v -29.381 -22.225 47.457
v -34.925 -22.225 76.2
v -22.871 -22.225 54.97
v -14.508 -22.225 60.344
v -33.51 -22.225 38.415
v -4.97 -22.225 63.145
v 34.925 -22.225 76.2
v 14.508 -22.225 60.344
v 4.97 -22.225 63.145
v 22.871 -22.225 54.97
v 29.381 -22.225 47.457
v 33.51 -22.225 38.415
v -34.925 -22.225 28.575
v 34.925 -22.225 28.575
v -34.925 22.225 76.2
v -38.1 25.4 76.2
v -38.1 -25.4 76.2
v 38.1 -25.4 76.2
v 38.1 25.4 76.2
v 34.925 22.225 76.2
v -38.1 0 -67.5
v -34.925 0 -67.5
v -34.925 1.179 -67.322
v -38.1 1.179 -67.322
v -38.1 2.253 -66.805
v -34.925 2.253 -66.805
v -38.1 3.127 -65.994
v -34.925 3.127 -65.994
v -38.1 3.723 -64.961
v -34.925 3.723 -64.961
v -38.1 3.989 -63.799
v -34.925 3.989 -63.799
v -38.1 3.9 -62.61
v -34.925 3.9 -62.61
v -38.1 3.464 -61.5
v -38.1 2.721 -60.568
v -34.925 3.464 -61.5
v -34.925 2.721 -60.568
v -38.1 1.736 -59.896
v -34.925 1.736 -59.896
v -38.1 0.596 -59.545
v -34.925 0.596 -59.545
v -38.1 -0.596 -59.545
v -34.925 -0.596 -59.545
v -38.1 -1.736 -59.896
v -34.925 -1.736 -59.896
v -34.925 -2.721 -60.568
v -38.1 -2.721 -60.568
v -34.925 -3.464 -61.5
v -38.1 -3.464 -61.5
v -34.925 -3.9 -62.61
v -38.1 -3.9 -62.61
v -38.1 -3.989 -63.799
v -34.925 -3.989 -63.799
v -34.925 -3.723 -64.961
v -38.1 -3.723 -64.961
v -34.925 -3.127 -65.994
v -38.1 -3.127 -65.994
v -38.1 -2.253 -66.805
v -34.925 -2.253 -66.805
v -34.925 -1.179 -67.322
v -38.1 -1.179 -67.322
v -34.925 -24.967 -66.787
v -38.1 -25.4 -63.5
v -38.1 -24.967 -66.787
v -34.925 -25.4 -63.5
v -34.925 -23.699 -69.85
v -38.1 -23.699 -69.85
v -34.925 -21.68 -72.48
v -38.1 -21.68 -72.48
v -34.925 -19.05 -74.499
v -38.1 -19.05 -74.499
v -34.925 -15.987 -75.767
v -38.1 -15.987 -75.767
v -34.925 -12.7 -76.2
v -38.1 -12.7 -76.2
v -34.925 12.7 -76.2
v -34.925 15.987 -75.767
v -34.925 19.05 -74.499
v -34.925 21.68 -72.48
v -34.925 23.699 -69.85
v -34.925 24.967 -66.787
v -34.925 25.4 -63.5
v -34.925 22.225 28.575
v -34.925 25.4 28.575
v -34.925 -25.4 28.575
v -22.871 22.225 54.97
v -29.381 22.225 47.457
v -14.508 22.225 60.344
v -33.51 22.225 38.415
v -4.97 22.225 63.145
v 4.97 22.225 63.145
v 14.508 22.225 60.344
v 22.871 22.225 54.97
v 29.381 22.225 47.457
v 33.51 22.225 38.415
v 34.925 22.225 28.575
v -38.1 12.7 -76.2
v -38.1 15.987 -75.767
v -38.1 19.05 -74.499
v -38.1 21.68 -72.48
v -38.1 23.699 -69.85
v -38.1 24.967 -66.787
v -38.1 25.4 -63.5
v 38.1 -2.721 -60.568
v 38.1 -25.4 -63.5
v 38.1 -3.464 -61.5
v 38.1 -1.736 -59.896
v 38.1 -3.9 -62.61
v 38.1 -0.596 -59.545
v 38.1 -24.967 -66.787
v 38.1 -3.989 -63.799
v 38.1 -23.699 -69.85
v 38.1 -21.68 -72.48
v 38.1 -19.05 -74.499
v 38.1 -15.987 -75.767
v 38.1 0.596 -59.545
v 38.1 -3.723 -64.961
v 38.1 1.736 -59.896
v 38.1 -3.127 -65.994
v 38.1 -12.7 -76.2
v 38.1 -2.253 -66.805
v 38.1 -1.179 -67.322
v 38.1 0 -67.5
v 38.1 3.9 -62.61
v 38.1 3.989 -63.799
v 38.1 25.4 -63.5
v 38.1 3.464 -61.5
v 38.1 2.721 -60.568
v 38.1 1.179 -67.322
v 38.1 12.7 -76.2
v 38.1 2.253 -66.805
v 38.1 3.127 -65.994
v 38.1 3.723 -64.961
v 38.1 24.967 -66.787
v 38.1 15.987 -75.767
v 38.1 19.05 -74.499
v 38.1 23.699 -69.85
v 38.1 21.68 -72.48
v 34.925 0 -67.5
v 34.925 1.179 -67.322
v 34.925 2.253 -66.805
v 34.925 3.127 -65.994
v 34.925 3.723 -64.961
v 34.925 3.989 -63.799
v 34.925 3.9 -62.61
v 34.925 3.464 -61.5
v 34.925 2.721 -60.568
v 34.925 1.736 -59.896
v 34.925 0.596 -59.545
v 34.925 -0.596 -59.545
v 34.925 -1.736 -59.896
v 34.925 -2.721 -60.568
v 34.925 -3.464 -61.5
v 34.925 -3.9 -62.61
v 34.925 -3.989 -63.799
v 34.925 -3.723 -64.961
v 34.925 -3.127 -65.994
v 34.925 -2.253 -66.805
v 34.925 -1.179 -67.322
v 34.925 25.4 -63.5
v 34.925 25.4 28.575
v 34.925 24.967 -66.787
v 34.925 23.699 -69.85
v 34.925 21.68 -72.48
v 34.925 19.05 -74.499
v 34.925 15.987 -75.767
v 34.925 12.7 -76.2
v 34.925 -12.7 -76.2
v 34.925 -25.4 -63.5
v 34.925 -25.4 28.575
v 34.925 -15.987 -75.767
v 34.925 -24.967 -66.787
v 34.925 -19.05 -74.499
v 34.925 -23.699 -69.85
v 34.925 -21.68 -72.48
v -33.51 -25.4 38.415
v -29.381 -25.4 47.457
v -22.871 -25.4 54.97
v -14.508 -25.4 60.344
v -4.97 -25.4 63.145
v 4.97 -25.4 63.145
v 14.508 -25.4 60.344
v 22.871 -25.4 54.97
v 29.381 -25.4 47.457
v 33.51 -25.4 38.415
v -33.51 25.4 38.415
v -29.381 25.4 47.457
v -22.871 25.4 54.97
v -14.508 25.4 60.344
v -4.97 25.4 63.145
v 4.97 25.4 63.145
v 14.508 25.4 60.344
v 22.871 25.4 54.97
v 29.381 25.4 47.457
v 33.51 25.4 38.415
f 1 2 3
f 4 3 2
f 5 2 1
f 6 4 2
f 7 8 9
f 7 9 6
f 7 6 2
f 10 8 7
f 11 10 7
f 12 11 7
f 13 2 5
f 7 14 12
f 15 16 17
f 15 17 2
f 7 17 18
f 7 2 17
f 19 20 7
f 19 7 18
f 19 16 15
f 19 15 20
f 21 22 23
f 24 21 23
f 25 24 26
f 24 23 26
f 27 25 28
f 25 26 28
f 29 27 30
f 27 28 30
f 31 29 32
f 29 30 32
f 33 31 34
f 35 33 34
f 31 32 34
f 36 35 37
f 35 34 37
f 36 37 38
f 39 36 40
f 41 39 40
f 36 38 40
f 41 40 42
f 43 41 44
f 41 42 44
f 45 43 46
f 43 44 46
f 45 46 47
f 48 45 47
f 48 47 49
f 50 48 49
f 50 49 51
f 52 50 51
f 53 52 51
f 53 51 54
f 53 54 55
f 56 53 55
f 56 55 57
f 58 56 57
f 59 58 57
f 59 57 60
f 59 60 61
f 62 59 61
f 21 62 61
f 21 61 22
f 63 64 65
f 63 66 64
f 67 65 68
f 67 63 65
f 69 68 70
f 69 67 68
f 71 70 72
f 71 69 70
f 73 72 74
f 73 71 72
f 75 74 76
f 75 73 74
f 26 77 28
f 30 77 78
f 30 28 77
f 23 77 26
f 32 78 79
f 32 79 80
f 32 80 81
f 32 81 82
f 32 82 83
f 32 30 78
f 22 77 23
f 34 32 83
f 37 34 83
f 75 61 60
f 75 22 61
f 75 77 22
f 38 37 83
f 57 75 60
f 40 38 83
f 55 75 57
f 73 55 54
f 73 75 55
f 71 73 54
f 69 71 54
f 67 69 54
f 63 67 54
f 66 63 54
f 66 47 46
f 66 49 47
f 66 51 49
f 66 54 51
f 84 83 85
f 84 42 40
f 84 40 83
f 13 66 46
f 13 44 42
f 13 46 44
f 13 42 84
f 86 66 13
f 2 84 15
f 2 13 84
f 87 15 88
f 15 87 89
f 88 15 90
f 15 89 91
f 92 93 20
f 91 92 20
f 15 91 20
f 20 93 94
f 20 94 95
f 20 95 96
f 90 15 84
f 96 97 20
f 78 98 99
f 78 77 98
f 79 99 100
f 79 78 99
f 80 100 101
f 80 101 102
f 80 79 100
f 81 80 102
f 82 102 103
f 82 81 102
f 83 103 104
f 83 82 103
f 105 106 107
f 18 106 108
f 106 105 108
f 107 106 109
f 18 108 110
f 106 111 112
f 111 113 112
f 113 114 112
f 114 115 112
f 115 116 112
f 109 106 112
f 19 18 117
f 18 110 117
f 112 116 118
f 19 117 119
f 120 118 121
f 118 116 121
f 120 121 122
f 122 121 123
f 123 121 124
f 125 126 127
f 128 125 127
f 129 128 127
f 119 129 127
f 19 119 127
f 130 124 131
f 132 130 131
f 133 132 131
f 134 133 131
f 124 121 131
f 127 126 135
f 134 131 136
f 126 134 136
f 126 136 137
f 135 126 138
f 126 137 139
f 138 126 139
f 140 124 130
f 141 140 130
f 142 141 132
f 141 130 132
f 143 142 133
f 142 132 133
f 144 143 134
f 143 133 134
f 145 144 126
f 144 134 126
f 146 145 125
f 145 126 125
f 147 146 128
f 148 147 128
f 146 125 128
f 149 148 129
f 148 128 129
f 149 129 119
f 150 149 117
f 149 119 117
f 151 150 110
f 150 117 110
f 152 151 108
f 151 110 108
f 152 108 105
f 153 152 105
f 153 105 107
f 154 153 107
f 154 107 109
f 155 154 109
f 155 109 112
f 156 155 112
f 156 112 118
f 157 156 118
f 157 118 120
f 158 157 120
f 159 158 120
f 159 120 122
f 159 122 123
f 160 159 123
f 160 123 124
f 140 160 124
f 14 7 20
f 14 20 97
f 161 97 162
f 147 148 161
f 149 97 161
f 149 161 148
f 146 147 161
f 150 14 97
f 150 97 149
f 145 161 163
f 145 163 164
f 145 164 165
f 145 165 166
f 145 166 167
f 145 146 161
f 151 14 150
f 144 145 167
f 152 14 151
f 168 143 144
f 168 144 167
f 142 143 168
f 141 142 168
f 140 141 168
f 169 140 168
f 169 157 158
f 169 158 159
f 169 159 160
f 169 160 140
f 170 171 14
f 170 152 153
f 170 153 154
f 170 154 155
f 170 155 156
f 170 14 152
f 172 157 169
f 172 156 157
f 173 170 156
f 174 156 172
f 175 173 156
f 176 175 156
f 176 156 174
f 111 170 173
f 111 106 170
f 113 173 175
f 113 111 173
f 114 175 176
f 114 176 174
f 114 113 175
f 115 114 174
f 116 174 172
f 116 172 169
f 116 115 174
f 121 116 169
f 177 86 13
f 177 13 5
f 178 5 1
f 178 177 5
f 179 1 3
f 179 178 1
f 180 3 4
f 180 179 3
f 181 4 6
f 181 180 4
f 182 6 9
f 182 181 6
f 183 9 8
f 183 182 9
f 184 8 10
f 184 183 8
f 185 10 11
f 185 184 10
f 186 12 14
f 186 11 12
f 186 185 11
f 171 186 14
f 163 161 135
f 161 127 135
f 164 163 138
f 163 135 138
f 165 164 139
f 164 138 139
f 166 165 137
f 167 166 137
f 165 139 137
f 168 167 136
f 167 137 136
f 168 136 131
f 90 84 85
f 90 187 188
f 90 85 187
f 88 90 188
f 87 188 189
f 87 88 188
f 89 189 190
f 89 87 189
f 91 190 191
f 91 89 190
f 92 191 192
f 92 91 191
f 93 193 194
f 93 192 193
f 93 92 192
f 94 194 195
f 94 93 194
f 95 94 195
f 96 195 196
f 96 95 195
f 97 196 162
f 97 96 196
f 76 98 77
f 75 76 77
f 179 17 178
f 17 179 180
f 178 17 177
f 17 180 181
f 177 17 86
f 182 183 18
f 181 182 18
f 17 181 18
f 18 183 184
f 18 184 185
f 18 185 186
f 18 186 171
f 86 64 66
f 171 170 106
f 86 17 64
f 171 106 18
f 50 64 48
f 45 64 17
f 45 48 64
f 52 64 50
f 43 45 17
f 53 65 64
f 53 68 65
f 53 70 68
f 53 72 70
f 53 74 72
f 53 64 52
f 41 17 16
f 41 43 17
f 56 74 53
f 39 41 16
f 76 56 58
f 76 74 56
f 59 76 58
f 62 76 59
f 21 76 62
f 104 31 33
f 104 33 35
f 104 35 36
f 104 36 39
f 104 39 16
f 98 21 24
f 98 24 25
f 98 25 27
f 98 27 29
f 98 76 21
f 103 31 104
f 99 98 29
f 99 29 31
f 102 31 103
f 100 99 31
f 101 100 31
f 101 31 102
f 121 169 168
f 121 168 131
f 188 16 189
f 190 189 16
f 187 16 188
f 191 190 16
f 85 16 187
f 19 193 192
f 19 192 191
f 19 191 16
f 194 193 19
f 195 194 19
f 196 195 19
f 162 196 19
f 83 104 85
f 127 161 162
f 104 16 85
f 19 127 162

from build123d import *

# Parameters (mm, degrees)
BOSS_EXTRUDE1_DEPTH      = 76.2
BOSS_EXTRUDE1_DEPTH_BACK = 76.2
SKETCH3_W                = 76.2
SKETCH3_H                = 50.8
SKETCH3_W_2              = 69.85
SKETCH3_H_2              = 44.45
CUT_EXTRUDE1_DEPTH       = 100.190170884
CUT_EXTRUDE1_DEPTH_BACK  = 100.190170884
SKETCH7_R                = 4
CUT_EXTRUDE2_DEPTH       = 111.716033166
FILLET1_R                = 12.7


with BuildPart() as part:
    # Sketch3 → Boss-Extrude1 (new, two sides: drawn at the far end of the back side and taken through both)
    with BuildSketch(Plane.XY.offset(-BOSS_EXTRUDE1_DEPTH_BACK)):
        Rectangle(SKETCH3_W, SKETCH3_H)
        Rectangle(SKETCH3_W_2, SKETCH3_H_2, mode=Mode.SUBTRACT)
    extrude(amount=BOSS_EXTRUDE1_DEPTH + BOSS_EXTRUDE1_DEPTH_BACK)

    # Sketch6 → Cut-Extrude1 (cut, two sides: drawn at the far end of the back side and taken through both)
    with BuildSketch(Plane(origin=(0, 25.4, 0), x_dir=(1, 0, 0), z_dir=(0, 1, 0)).offset(-CUT_EXTRUDE1_DEPTH_BACK)):
        with BuildLine():
            Line((34.925, 76.2), (-34.925, 76.2))
            Line((-34.925, 76.2), (-34.925, -28.575))
            ThreePointArc((-34.925, -28.575), (0, -63.5), (34.925, -28.575))
            Line((34.925, -28.575), (34.925, 76.2))
        make_face()
    extrude(amount=CUT_EXTRUDE1_DEPTH + CUT_EXTRUDE1_DEPTH_BACK, mode=Mode.SUBTRACT)

    # Sketch7 → Cut-Extrude2 (cut, through all)
    with BuildSketch(Plane(origin=(38.1, 0, 0), x_dir=(0, 0, -1), z_dir=(1, 0, 0))):
        with Locations((63.5, 0)):
            Circle(SKETCH7_R)
    extrude(amount=-CUT_EXTRUDE2_DEPTH, mode=Mode.SUBTRACT)

    # Fillet1
    fillet1_edges = [part.edges().sort_by_distance(p)[0] for p in [
        (36.5125, 25.4, -76.2),
        (-36.5125, -25.4, -76.2),
        (-36.5125, 25.4, -76.2),
        (36.5125, -25.4, -76.2),
    ]]
    fillet(fillet1_edges, radius=FILLET1_R)


solid = part.part
